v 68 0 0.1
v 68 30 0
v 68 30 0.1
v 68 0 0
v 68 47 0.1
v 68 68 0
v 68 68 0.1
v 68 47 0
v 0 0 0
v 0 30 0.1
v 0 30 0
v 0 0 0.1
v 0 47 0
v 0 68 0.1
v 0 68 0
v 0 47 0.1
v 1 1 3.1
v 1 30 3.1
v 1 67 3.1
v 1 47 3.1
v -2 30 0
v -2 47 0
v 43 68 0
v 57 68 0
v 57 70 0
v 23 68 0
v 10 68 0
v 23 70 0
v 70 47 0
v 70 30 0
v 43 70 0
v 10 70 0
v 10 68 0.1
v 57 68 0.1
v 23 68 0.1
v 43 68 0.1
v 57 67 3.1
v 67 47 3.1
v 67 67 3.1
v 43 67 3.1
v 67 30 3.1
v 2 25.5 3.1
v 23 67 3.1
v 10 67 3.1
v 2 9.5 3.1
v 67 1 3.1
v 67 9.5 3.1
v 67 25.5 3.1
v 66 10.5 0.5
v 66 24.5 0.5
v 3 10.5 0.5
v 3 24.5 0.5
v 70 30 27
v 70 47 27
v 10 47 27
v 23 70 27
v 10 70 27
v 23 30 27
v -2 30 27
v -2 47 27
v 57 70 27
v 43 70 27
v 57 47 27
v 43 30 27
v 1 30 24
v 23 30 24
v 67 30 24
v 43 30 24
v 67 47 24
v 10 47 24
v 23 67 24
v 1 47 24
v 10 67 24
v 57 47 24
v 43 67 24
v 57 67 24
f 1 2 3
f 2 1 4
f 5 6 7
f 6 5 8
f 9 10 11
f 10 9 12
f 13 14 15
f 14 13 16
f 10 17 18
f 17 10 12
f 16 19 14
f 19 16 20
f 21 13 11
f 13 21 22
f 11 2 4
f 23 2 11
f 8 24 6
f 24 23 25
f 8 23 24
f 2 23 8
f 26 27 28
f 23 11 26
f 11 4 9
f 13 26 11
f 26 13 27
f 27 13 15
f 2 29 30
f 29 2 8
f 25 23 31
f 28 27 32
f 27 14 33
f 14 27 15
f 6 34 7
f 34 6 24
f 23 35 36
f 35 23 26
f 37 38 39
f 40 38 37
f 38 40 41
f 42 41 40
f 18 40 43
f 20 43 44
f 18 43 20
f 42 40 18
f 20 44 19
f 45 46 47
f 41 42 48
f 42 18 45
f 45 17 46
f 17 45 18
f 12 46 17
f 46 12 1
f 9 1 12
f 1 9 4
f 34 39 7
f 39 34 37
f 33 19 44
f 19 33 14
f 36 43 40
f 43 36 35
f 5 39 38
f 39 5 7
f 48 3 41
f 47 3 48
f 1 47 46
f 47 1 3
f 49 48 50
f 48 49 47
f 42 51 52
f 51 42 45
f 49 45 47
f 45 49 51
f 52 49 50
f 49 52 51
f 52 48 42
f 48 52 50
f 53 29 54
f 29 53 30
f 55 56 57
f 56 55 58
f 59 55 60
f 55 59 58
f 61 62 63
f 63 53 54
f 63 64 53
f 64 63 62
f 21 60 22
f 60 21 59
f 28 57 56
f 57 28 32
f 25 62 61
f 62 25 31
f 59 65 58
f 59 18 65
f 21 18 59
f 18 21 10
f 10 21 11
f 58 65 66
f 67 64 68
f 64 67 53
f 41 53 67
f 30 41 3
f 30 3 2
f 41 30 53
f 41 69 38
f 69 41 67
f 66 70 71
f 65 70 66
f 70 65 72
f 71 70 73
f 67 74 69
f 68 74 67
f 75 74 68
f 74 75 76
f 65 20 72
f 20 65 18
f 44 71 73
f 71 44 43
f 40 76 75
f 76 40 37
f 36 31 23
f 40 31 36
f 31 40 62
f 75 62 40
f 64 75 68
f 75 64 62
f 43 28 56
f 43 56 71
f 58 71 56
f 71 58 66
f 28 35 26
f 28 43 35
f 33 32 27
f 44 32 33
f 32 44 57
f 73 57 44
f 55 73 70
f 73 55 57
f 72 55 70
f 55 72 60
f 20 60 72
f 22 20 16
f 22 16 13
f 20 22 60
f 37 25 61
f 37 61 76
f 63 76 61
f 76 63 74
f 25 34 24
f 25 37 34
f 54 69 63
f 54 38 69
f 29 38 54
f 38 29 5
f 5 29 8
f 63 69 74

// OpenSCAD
// Base Config
base_W = 23.5;
base_H = 24;
base_T = 0.5;
default_T = 2.0;
default_S = 12;
// $fn = 60; // When this line comment out, my pc was stoped.
// Ring Config
ring_H = 10;
ring_base_R = 24;
ring_base_W = 6;
minkowski_R = 2;

difference() {
    hull(){
        translate([0, 0, 0]) cube([68, 68, 0.1]);
        translate([1, 1, 3]) cube([66, 66, 0.1]);
    }
    hull(){
        translate([3, 10.5, 0.5]) cube([63, 14, 0.1]);
        translate([2, 9.5, 3.1]) cube([65, 16, 0.1]);
    }
}

difference() {
    translate([-2, 30, 0]) cube([72, 40, 27]);
    translate([1, 27, 3]) cube([66, 40, 21]);
    #translate([23, 28, -2]) cube([20, 80, 30]);
    #translate([-10, 47, -2]) cube([20, 40, 30]);
    #translate([57, 47, -2]) cube([20, 40, 30]);
}

*translate([1, 1, 0]) cube([30, 3, 30.5]);
*translate([1, 4, 30]) rotate([0, 90, 0]) cylinder(h=30, r=1, center=false, $fn=3);
*translate([1, 1, 30]) cube([30, 8, 2]);

*translate([1, 73, 0]) cube([30, 3, 30.5]);
*translate([1, 73, 30]) rotate([0, 90, 0]) cylinder(h=30, r=1, center=false, $fn=3);
*translate([1, 68, 30]) cube([30, 8, 2]);

*translate([28, 35, 0]) cube([60, 25, 3]);
*translate([88, 35, -10]) cube([3, 25, 20]);

// base block
//staple_base(base_T,base_W,base_H,default_S,default_T);
// hull(){
//     translate([1, 16, default_T]) cube([base_W - 2, 26, default_T]);
//     translate([1, 17, default_T * 2]) cube([base_W - 2, 20, default_T]);
// }
// Ring block
// translate([11.75, 32, 35]) {
//     rotate([90, 180, 0]) {
//         // Ring part
//         translate([0, 0, minkowski_R]) {
//             minkowski() {
//                 difference() {
//                     cylinder(h = ring_H, r = ring_base_R + ring_base_W);
//                     union() {
//                         cylinder(h = ring_H, r1 = ring_base_R, r2 = ring_base_R + (ring_base_W / 2));
//                         translate([-12.5, -33, 0]) cube(25);
//                     }
//                 }
//                 sphere(minkowski_R);
//             }
//         }
//     }
// }

module stapler_area(bt,bw,ds,dt) {
    hull() {
        translate([0, 0, dt - bt]) cube([bw - dt, ds + 2, 0.1]);
        translate([1, 1, 0]) cube([bw - dt * 2, ds, 0.1]);
    }
}

module staple_base(bt,bw,bh,ds,dt) {
    union() {
        // Base1(Bottom)
        cube([bw, bh, bt]);
        // Base2(Top)
        translate([0, 0, bt]) {
            difference() {
                // Base2_body
                hull() {
                    translate([1, 1, dt - bt]) cube([bw - 2, bh - 2, 0.1]);
                    translate([0, 0, 0]) cube([bw, bh, 0.1]);
                }
                // Base2_stapler_area1(Top)
                # translate([dt - 1, dt - 1, 0]) stapler_area(bt,bw,ds,dt);
                // Base2_stapler_area2(Bottom)
                # translate([dt - 1, bh - ds - dt - 1, 0]) stapler_area(bt,bw,ds,dt);
            }
        }
    }
}
